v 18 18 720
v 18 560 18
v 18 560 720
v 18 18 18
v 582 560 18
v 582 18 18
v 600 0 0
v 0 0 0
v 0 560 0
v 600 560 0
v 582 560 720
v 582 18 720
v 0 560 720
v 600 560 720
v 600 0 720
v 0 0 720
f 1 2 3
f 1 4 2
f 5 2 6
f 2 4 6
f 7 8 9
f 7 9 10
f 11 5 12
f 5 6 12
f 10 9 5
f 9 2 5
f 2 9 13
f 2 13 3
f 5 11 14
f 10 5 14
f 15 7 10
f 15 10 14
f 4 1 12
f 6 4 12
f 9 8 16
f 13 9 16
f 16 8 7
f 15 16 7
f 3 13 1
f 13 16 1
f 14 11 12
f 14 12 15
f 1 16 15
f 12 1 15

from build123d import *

# Parameters (mm, degrees)
F0_W     = 60.619533062
F0_H     = 48.4413802624
F1_DEPTH = 560
F2_DEPTH = 600
F3_DEPTH = 720
F4_T     = -18


with BuildPart() as f1:
    # F0 (on Front) → F1 (new body)
    with BuildSketch(Plane.XZ):
        with Locations((30.309766531, 24.2206901312)):
            Rectangle(F0_W, F0_H)
    extrude(amount=-F1_DEPTH)

    # F2 (add): a face of the model
    f2_faces = [f1.faces().sort_by_distance(p)[0] for p in [
        (0, 280, 24.2206901312),
    ]]
    extrude(f2_faces, amount=-F2_DEPTH)

    # F3 (add): a face of the model
    f3_faces = [f1.faces().sort_by_distance(p)[0] for p in [
        (300, 280, 0),
    ]]
    extrude(f3_faces, amount=-F3_DEPTH)

    # F4
    f4_openings = [f1.faces().sort_by_distance(p)[0] for p in [
        (300, 560, 360),
        (300, 280, 720),
    ]]
    offset(amount=F4_T, openings=f4_openings)


solid = f1.part
